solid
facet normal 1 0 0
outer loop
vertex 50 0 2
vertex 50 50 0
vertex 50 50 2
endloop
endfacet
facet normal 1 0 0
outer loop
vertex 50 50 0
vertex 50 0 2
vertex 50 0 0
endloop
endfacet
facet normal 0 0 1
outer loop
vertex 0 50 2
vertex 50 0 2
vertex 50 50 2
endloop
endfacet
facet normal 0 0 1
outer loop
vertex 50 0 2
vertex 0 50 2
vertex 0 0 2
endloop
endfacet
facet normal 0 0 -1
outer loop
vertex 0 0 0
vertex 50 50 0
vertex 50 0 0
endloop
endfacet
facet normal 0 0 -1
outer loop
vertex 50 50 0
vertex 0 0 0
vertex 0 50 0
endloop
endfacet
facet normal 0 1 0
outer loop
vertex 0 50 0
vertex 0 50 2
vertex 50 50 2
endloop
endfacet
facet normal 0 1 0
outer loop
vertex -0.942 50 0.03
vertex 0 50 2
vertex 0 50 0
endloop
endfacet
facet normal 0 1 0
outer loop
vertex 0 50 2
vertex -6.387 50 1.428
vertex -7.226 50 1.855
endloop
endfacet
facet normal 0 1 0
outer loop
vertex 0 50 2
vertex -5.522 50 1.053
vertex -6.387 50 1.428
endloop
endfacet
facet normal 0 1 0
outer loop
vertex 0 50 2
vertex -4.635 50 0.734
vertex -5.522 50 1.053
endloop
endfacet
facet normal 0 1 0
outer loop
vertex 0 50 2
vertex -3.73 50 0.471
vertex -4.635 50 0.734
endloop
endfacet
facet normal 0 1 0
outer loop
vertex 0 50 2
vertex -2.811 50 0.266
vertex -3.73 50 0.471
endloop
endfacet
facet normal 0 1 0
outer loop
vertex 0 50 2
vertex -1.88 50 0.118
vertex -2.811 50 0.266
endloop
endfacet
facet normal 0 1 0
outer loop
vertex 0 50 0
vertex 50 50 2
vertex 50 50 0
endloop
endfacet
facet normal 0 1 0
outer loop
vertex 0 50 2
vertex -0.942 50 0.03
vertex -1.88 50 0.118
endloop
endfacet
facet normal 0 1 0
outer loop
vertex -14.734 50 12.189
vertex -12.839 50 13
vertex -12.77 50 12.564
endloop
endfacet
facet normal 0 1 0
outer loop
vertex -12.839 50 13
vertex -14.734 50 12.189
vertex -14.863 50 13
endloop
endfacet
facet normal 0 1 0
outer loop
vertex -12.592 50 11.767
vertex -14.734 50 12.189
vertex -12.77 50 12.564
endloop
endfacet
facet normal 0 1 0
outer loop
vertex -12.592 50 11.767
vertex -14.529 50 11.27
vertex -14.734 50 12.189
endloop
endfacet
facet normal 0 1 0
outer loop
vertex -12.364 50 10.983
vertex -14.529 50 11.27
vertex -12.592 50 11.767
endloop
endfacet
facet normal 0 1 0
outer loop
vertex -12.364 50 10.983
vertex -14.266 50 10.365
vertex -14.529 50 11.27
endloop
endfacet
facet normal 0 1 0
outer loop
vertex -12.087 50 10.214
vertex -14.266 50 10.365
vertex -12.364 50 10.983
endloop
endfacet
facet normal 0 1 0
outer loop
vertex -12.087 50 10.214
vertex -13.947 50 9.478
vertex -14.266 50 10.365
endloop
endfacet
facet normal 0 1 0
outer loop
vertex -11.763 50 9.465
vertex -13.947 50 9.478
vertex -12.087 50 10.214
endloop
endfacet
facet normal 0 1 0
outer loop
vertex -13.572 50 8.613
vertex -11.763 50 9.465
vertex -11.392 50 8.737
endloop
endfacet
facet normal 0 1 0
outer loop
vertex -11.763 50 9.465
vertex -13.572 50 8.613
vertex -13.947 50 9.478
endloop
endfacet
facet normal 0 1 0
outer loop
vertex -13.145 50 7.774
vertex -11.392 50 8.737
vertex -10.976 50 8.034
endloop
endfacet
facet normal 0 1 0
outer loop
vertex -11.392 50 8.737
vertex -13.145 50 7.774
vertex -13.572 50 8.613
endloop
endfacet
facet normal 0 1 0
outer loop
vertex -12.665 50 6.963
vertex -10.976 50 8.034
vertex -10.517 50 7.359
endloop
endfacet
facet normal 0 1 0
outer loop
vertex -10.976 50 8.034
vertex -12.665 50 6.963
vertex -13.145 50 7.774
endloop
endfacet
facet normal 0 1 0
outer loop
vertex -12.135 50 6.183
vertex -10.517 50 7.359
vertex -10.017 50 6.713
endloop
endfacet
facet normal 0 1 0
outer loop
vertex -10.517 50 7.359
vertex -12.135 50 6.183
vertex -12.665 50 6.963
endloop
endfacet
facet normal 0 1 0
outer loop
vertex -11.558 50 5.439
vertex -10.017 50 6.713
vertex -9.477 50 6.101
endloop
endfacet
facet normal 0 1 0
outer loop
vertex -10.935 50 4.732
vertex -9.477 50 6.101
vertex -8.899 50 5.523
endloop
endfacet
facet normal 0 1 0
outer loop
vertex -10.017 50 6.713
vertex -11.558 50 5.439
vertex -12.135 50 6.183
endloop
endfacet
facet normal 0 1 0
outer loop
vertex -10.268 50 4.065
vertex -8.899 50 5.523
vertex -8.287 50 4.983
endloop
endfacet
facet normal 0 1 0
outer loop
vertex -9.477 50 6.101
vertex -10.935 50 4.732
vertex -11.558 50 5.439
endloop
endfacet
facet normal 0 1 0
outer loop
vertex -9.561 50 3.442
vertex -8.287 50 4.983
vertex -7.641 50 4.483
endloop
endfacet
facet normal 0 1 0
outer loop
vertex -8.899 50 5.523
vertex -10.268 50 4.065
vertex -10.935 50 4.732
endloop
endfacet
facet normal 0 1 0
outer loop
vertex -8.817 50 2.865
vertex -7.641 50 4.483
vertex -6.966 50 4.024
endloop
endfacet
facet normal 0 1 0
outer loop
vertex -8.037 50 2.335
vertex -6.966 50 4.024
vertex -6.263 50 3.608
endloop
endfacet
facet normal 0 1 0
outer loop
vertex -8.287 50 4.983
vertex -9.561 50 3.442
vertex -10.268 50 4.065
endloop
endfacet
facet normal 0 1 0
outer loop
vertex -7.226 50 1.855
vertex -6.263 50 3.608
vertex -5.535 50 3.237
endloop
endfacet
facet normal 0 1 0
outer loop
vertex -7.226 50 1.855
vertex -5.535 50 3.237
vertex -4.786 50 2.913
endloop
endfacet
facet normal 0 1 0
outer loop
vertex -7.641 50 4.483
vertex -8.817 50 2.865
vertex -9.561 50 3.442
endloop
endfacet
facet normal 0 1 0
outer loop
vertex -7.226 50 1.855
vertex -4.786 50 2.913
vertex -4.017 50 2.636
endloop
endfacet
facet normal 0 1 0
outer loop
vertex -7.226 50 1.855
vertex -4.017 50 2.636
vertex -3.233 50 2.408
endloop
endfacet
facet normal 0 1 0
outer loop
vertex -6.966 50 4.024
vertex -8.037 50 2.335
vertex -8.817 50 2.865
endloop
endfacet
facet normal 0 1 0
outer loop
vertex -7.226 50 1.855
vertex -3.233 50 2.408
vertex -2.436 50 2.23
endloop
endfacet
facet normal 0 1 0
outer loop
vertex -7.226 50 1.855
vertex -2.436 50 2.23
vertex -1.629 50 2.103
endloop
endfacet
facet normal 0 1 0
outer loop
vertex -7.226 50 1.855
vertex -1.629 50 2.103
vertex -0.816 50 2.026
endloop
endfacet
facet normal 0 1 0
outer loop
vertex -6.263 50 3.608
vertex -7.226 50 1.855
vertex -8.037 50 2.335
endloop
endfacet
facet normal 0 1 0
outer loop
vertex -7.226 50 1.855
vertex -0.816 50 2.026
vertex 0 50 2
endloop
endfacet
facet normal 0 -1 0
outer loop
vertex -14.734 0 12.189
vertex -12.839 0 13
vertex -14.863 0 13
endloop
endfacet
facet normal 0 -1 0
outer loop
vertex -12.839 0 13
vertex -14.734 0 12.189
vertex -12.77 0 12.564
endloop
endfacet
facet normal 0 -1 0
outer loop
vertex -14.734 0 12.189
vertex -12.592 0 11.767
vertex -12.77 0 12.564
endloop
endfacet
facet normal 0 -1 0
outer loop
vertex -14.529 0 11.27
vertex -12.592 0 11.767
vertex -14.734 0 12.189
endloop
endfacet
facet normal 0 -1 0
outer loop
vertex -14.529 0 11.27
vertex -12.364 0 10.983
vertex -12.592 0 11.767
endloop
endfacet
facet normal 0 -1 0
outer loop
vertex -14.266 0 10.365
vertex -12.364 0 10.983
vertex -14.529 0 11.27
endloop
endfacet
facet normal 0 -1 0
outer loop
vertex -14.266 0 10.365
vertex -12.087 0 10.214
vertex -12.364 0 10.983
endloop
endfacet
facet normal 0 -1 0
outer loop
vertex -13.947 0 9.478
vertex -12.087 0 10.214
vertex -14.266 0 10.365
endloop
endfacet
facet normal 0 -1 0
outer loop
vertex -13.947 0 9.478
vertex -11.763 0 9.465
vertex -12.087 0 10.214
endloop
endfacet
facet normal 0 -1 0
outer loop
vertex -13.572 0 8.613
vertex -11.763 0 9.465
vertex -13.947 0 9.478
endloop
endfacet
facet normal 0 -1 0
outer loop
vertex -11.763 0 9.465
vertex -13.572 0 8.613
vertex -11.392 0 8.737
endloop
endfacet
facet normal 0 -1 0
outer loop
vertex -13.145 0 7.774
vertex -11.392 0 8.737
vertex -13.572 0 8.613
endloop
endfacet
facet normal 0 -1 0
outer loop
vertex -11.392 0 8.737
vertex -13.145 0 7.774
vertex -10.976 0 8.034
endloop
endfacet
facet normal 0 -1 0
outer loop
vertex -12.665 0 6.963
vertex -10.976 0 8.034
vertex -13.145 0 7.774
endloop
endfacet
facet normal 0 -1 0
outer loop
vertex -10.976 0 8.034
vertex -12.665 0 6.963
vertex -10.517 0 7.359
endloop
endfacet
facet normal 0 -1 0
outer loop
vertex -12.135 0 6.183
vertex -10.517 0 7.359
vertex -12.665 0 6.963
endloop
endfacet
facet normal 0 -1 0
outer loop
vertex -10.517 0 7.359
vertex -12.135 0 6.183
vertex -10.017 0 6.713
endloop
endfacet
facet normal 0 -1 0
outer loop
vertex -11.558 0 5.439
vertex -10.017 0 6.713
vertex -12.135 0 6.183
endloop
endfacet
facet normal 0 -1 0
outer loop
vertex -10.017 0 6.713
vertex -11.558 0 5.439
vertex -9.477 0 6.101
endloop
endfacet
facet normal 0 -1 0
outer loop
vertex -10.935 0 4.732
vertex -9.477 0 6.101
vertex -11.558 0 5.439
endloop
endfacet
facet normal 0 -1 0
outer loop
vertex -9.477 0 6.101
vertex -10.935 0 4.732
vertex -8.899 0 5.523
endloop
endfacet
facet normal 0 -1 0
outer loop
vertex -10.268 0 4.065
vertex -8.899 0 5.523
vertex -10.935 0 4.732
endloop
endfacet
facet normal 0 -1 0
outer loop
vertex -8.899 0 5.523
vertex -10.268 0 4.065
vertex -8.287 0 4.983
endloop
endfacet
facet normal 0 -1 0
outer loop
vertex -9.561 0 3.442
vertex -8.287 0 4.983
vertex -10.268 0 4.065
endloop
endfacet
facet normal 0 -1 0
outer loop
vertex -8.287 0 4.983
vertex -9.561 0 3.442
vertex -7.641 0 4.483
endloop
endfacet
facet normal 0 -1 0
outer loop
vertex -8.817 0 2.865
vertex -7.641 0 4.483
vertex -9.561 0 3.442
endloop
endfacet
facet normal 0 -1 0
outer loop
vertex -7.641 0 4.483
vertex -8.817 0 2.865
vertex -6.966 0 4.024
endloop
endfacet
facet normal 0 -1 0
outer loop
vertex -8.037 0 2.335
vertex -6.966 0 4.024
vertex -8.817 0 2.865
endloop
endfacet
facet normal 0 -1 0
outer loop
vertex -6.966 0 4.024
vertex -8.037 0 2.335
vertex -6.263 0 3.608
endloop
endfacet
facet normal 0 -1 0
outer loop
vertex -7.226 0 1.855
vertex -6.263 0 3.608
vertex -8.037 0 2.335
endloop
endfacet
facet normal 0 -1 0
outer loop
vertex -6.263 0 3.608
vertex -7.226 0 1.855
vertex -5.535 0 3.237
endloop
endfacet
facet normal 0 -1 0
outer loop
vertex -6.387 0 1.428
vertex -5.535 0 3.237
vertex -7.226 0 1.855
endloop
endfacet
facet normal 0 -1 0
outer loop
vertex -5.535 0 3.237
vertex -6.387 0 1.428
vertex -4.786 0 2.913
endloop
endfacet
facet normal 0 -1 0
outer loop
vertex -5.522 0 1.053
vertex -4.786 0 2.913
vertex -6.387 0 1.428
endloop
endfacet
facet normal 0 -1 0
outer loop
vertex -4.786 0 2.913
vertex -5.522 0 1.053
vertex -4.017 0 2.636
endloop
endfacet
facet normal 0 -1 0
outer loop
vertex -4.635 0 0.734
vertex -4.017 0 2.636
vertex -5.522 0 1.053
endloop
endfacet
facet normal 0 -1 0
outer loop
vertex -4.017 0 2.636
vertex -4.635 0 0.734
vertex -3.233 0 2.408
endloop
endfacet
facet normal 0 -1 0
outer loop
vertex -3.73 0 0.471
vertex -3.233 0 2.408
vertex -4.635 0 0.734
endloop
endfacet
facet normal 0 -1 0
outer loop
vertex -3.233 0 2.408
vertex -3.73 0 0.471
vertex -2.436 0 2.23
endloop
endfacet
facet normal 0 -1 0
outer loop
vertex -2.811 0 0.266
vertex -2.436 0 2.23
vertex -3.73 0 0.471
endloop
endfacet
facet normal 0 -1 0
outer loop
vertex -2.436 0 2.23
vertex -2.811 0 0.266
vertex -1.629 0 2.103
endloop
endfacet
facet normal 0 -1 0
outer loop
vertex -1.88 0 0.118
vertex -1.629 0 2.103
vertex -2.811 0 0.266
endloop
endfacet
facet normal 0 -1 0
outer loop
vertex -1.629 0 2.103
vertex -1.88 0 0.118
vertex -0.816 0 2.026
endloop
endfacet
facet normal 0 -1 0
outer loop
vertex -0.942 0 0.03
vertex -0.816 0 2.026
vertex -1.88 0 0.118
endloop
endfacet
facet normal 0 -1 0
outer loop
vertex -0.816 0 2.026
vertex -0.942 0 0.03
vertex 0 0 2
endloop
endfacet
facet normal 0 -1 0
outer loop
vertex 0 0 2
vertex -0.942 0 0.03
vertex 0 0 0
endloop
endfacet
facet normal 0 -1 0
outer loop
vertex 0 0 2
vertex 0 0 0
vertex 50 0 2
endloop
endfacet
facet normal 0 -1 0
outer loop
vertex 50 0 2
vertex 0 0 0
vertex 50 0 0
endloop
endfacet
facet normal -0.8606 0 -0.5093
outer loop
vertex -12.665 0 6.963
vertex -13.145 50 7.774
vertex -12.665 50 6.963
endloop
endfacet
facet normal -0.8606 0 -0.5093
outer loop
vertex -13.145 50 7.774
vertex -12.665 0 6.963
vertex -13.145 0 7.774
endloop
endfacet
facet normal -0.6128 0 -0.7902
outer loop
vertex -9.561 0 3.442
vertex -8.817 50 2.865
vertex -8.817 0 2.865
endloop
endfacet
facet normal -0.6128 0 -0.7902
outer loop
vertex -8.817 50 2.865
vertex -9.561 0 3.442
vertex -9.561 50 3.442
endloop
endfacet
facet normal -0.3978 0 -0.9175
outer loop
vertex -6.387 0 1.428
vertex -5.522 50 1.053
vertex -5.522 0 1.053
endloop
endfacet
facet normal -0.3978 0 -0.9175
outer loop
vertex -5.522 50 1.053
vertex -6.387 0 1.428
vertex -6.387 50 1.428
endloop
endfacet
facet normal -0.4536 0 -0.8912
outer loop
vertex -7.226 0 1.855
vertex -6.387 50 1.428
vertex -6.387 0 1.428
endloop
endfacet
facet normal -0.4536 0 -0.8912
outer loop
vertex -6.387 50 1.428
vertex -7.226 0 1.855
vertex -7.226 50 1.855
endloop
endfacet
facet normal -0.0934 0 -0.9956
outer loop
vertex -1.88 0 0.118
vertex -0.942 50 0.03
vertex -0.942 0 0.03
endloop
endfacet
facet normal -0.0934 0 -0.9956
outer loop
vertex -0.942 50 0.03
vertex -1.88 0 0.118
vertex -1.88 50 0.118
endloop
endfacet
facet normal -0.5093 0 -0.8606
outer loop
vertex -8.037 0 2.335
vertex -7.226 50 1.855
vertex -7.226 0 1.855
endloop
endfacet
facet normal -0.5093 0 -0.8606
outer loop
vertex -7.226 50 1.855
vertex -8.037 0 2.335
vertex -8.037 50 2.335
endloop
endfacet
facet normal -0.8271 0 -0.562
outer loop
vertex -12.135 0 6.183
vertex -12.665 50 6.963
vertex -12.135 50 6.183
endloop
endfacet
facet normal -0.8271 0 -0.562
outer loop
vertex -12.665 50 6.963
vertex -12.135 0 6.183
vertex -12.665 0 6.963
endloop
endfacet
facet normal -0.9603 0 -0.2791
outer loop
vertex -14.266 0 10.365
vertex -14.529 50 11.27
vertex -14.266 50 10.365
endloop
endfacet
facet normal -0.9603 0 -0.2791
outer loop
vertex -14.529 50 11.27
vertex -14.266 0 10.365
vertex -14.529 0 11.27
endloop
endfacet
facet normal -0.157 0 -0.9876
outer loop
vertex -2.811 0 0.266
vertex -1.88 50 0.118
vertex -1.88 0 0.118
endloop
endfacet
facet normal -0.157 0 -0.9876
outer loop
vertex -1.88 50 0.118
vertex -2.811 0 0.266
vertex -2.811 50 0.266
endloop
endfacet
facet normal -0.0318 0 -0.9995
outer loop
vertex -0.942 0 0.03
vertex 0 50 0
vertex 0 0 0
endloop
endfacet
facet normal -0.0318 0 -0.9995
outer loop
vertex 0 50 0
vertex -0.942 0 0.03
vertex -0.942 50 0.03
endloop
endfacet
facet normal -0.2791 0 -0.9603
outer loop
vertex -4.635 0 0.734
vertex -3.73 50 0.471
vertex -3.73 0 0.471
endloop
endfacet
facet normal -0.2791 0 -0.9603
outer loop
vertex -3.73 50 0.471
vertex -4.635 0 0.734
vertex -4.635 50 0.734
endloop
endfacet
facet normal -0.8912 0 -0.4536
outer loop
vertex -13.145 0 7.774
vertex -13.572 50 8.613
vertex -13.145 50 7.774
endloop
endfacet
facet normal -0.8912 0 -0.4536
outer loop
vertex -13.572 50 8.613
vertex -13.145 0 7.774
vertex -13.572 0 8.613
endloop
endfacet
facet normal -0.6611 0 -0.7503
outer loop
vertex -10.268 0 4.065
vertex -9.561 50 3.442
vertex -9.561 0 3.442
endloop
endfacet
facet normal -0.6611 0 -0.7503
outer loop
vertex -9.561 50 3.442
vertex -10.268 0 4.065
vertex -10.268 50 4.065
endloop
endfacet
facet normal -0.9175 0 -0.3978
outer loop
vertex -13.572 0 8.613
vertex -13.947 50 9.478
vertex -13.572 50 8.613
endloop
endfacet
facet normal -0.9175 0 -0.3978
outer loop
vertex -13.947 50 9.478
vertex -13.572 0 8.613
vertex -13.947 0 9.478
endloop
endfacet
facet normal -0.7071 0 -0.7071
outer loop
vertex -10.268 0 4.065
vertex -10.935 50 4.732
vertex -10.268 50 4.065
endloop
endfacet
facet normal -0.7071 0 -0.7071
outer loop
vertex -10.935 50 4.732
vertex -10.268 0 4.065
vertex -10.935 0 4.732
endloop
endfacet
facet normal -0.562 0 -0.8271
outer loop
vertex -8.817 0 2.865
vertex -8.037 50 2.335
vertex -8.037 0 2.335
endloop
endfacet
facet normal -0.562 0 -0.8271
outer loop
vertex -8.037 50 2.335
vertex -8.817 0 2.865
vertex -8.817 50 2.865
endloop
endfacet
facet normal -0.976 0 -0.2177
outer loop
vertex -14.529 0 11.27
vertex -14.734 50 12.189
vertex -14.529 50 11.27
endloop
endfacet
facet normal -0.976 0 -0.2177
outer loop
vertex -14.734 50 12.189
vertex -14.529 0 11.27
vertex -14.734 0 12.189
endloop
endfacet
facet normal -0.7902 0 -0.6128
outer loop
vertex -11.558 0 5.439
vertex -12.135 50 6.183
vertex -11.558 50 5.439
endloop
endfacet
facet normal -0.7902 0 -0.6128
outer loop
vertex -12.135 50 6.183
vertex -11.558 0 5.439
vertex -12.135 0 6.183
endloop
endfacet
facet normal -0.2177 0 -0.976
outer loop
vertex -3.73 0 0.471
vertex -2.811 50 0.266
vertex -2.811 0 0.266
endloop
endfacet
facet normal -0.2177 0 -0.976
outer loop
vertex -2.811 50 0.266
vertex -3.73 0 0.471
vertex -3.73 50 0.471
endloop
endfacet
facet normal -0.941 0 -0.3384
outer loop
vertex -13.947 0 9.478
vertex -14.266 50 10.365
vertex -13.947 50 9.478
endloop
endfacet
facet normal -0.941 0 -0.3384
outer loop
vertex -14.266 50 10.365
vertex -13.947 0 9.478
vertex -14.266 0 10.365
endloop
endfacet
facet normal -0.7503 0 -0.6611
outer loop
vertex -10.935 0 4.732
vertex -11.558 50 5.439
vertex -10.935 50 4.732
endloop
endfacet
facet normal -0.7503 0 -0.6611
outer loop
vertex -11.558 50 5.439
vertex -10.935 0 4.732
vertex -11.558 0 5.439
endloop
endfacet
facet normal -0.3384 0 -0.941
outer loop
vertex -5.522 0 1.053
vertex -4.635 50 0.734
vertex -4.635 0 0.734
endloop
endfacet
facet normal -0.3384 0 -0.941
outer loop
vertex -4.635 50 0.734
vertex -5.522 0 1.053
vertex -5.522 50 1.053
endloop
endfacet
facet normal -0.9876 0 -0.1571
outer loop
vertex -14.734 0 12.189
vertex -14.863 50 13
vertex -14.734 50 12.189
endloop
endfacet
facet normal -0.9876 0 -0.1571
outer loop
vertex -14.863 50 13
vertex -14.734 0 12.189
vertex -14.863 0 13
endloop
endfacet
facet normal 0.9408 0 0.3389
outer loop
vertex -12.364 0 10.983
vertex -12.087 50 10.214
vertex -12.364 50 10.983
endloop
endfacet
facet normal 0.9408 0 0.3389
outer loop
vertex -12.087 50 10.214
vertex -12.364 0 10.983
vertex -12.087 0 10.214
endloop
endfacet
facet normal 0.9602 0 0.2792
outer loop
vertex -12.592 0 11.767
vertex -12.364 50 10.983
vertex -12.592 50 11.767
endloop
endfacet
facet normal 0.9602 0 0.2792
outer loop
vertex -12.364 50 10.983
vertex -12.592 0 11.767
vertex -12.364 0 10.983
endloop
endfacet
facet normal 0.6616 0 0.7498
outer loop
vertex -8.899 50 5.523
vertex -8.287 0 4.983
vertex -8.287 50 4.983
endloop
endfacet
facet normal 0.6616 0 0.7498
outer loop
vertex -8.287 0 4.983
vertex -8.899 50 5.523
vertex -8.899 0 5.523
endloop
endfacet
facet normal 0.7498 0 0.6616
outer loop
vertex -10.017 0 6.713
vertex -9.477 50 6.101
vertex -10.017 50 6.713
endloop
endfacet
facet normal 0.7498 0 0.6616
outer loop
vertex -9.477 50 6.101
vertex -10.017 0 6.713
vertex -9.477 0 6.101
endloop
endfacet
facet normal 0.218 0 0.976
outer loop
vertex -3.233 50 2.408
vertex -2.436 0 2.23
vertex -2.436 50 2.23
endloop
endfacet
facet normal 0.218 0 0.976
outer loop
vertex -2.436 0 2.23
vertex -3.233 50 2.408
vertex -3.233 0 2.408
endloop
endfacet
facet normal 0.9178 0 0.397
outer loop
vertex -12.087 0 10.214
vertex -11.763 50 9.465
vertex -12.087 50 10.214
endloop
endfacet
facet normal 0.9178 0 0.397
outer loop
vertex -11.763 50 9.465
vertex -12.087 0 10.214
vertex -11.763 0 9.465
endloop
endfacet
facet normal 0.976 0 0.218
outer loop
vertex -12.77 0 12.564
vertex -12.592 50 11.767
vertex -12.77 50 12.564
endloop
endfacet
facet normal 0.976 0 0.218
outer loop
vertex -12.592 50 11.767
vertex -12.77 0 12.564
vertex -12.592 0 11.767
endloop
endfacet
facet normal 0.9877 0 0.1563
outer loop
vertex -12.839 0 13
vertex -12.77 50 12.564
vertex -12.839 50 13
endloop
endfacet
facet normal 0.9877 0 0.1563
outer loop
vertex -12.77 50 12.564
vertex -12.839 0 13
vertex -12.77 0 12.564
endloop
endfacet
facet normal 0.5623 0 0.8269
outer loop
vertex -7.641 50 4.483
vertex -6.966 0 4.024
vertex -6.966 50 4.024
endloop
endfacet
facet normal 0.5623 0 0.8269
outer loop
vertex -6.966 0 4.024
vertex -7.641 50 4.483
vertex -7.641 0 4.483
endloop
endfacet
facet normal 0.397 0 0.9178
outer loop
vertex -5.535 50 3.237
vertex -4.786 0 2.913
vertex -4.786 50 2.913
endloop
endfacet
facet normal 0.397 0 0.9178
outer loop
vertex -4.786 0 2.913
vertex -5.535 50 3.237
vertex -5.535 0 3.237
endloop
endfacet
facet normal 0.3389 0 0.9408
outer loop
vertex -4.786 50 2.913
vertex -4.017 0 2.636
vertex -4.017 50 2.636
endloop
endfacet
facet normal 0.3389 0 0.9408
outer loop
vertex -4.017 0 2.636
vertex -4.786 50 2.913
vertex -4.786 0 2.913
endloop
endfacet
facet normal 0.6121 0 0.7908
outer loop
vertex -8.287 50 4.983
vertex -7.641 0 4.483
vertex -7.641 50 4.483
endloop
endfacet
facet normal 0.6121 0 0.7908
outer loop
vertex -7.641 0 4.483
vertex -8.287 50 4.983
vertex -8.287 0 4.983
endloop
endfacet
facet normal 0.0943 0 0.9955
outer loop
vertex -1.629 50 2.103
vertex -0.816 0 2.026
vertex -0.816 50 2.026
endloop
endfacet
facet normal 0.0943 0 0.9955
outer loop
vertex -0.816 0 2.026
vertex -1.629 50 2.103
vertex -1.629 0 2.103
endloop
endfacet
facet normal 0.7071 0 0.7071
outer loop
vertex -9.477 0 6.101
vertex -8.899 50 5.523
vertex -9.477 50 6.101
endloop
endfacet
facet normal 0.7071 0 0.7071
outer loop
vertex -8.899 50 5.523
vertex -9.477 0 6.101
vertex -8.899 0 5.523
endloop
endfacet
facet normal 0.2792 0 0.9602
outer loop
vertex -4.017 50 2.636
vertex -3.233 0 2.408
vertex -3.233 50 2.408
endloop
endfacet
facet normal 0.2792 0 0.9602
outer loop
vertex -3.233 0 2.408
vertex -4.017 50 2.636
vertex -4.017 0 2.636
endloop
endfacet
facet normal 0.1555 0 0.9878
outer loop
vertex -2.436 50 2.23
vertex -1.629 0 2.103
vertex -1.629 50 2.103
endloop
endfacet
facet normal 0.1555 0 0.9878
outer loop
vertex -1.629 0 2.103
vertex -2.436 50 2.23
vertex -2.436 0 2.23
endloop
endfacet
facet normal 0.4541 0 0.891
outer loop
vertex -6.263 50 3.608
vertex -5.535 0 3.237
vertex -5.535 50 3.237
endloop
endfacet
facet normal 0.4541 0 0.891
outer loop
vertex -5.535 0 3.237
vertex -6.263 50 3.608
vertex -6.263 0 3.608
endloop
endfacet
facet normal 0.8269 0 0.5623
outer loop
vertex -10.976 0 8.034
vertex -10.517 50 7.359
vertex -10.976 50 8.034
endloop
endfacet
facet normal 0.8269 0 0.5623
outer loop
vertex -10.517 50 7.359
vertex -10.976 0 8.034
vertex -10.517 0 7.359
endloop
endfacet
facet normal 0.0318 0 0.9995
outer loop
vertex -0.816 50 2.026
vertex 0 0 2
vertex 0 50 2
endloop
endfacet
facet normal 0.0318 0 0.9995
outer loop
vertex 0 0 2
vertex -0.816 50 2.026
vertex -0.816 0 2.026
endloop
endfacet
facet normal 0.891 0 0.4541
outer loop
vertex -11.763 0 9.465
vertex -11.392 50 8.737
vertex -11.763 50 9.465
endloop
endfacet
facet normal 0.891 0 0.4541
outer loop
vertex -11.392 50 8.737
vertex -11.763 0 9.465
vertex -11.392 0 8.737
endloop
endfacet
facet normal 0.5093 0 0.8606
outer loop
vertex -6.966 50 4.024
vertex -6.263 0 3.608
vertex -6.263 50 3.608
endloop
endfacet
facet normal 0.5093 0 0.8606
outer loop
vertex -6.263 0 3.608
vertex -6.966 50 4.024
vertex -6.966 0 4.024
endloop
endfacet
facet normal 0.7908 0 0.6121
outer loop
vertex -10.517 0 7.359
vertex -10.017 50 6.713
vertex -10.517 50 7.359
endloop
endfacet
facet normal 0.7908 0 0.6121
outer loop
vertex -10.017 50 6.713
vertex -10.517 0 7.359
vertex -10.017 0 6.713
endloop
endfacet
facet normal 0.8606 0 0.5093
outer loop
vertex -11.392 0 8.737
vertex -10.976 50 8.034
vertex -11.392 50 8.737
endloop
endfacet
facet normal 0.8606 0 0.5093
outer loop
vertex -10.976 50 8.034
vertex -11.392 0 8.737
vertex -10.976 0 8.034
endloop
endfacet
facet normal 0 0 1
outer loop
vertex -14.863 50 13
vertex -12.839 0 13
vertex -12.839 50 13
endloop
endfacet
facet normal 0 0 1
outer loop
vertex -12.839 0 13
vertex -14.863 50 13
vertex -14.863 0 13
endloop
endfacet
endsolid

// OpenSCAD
difference(){
	union(){



        translate([0,0,0]){
           cube([50,50,2], center=false);
        }        


             
        translate([0,0,15]){
            rotate([-90,0,0]){
               cylinder(h=50, r=15, $fn=100, center=false);
            }
        }      
        
        
	}
	union() {
        translate([0,-1,15]){
            rotate([-90,0,0]){
               cylinder(h=60, r=13, $fn=100, center=false);
            }
        }      
        translate([0,-10,2]){
           cube([60,70,100], center=false);
        }        
        translate([-20,-10,13]){
           cube([60,70,100], center=false);
        }        



	}
}
